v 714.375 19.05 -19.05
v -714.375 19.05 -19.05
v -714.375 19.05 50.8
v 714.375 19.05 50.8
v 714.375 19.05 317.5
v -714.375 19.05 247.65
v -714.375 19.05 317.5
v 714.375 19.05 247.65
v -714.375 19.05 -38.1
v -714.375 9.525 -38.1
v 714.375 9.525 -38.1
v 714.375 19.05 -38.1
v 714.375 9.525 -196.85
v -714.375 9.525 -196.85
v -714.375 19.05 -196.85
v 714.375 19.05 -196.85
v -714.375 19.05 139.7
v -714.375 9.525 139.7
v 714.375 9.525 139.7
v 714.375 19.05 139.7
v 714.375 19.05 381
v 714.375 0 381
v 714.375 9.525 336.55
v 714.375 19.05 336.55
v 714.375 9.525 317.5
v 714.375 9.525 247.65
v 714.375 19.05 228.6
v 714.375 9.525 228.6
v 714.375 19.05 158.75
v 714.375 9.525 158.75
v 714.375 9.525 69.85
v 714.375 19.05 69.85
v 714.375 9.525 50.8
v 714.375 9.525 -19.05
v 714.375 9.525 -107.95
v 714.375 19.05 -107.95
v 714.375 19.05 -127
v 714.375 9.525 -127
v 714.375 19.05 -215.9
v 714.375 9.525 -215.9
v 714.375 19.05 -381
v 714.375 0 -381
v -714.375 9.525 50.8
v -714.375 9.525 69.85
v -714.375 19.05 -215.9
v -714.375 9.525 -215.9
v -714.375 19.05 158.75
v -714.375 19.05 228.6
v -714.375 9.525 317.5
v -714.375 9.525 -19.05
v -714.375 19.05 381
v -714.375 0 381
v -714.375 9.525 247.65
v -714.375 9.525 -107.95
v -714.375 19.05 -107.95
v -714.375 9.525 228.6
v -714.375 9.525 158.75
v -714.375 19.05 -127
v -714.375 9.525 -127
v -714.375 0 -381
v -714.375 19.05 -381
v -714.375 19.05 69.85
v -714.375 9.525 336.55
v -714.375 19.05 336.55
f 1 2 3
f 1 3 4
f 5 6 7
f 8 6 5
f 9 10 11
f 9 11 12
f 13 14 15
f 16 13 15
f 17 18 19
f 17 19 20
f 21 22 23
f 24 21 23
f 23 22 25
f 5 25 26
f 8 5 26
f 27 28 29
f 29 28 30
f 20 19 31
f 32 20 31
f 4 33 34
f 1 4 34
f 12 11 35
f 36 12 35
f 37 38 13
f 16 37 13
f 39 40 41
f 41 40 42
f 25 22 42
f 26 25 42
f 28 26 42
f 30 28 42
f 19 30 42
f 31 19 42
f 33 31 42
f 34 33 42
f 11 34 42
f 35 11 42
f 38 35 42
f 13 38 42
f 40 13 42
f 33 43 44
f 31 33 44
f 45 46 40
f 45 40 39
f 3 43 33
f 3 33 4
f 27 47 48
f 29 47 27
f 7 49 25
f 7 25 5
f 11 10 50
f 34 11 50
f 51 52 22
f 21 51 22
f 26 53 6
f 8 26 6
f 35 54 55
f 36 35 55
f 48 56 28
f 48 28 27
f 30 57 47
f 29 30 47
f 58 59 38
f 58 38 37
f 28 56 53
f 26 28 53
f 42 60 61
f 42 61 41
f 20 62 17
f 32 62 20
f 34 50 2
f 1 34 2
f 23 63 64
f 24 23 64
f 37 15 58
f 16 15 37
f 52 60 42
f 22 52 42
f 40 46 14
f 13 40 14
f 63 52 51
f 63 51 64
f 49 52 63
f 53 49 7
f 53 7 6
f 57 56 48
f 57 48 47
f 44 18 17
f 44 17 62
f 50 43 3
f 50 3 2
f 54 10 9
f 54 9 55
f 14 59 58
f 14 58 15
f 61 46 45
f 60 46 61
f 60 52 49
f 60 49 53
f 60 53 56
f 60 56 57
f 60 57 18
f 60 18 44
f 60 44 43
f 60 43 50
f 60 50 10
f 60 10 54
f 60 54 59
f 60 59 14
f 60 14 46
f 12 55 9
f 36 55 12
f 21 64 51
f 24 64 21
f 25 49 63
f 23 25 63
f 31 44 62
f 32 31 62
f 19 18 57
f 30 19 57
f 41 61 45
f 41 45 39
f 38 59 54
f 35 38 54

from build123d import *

# Parameters (mm, degrees)
SKETCH1_W          = 1428.75
SKETCH1_H          = 762
BOARD_DEPTH        = 19.05
SKETCH9_W          = 19.05
SKETCH9_H          = 9.525
CUT_EXTRUDE1_DEPTH = 1479.800346565
LPATTERN1_COUNT    = 7
LPATTERN1_PITCH    = 88.9


with BuildPart() as part:
    # Sketch1 → Board (new body)
    with BuildSketch(Plane(origin=(0, 0, 0), x_dir=(1, 0, 0), z_dir=(0, 1, 0))):
        Rectangle(SKETCH1_W, SKETCH1_H)
    extrude(amount=BOARD_DEPTH)

    # Sketch9 → Cut-Extrude1 (cut, through all)
    with BuildSketch(Plane.ZY.offset(714.375)):
        with Locations((327.025, 14.2875)):
            Rectangle(SKETCH9_W, SKETCH9_H)
    cut_extrude1 = extrude(amount=-CUT_EXTRUDE1_DEPTH, mode=Mode.SUBTRACT)

    # LPattern1: Cut-Extrude1 ×7
    with Locations(*[(0, 0, -i * LPATTERN1_PITCH) for i in range(1, LPATTERN1_COUNT)]):
        add(cut_extrude1, mode=Mode.SUBTRACT)


solid = part.part
